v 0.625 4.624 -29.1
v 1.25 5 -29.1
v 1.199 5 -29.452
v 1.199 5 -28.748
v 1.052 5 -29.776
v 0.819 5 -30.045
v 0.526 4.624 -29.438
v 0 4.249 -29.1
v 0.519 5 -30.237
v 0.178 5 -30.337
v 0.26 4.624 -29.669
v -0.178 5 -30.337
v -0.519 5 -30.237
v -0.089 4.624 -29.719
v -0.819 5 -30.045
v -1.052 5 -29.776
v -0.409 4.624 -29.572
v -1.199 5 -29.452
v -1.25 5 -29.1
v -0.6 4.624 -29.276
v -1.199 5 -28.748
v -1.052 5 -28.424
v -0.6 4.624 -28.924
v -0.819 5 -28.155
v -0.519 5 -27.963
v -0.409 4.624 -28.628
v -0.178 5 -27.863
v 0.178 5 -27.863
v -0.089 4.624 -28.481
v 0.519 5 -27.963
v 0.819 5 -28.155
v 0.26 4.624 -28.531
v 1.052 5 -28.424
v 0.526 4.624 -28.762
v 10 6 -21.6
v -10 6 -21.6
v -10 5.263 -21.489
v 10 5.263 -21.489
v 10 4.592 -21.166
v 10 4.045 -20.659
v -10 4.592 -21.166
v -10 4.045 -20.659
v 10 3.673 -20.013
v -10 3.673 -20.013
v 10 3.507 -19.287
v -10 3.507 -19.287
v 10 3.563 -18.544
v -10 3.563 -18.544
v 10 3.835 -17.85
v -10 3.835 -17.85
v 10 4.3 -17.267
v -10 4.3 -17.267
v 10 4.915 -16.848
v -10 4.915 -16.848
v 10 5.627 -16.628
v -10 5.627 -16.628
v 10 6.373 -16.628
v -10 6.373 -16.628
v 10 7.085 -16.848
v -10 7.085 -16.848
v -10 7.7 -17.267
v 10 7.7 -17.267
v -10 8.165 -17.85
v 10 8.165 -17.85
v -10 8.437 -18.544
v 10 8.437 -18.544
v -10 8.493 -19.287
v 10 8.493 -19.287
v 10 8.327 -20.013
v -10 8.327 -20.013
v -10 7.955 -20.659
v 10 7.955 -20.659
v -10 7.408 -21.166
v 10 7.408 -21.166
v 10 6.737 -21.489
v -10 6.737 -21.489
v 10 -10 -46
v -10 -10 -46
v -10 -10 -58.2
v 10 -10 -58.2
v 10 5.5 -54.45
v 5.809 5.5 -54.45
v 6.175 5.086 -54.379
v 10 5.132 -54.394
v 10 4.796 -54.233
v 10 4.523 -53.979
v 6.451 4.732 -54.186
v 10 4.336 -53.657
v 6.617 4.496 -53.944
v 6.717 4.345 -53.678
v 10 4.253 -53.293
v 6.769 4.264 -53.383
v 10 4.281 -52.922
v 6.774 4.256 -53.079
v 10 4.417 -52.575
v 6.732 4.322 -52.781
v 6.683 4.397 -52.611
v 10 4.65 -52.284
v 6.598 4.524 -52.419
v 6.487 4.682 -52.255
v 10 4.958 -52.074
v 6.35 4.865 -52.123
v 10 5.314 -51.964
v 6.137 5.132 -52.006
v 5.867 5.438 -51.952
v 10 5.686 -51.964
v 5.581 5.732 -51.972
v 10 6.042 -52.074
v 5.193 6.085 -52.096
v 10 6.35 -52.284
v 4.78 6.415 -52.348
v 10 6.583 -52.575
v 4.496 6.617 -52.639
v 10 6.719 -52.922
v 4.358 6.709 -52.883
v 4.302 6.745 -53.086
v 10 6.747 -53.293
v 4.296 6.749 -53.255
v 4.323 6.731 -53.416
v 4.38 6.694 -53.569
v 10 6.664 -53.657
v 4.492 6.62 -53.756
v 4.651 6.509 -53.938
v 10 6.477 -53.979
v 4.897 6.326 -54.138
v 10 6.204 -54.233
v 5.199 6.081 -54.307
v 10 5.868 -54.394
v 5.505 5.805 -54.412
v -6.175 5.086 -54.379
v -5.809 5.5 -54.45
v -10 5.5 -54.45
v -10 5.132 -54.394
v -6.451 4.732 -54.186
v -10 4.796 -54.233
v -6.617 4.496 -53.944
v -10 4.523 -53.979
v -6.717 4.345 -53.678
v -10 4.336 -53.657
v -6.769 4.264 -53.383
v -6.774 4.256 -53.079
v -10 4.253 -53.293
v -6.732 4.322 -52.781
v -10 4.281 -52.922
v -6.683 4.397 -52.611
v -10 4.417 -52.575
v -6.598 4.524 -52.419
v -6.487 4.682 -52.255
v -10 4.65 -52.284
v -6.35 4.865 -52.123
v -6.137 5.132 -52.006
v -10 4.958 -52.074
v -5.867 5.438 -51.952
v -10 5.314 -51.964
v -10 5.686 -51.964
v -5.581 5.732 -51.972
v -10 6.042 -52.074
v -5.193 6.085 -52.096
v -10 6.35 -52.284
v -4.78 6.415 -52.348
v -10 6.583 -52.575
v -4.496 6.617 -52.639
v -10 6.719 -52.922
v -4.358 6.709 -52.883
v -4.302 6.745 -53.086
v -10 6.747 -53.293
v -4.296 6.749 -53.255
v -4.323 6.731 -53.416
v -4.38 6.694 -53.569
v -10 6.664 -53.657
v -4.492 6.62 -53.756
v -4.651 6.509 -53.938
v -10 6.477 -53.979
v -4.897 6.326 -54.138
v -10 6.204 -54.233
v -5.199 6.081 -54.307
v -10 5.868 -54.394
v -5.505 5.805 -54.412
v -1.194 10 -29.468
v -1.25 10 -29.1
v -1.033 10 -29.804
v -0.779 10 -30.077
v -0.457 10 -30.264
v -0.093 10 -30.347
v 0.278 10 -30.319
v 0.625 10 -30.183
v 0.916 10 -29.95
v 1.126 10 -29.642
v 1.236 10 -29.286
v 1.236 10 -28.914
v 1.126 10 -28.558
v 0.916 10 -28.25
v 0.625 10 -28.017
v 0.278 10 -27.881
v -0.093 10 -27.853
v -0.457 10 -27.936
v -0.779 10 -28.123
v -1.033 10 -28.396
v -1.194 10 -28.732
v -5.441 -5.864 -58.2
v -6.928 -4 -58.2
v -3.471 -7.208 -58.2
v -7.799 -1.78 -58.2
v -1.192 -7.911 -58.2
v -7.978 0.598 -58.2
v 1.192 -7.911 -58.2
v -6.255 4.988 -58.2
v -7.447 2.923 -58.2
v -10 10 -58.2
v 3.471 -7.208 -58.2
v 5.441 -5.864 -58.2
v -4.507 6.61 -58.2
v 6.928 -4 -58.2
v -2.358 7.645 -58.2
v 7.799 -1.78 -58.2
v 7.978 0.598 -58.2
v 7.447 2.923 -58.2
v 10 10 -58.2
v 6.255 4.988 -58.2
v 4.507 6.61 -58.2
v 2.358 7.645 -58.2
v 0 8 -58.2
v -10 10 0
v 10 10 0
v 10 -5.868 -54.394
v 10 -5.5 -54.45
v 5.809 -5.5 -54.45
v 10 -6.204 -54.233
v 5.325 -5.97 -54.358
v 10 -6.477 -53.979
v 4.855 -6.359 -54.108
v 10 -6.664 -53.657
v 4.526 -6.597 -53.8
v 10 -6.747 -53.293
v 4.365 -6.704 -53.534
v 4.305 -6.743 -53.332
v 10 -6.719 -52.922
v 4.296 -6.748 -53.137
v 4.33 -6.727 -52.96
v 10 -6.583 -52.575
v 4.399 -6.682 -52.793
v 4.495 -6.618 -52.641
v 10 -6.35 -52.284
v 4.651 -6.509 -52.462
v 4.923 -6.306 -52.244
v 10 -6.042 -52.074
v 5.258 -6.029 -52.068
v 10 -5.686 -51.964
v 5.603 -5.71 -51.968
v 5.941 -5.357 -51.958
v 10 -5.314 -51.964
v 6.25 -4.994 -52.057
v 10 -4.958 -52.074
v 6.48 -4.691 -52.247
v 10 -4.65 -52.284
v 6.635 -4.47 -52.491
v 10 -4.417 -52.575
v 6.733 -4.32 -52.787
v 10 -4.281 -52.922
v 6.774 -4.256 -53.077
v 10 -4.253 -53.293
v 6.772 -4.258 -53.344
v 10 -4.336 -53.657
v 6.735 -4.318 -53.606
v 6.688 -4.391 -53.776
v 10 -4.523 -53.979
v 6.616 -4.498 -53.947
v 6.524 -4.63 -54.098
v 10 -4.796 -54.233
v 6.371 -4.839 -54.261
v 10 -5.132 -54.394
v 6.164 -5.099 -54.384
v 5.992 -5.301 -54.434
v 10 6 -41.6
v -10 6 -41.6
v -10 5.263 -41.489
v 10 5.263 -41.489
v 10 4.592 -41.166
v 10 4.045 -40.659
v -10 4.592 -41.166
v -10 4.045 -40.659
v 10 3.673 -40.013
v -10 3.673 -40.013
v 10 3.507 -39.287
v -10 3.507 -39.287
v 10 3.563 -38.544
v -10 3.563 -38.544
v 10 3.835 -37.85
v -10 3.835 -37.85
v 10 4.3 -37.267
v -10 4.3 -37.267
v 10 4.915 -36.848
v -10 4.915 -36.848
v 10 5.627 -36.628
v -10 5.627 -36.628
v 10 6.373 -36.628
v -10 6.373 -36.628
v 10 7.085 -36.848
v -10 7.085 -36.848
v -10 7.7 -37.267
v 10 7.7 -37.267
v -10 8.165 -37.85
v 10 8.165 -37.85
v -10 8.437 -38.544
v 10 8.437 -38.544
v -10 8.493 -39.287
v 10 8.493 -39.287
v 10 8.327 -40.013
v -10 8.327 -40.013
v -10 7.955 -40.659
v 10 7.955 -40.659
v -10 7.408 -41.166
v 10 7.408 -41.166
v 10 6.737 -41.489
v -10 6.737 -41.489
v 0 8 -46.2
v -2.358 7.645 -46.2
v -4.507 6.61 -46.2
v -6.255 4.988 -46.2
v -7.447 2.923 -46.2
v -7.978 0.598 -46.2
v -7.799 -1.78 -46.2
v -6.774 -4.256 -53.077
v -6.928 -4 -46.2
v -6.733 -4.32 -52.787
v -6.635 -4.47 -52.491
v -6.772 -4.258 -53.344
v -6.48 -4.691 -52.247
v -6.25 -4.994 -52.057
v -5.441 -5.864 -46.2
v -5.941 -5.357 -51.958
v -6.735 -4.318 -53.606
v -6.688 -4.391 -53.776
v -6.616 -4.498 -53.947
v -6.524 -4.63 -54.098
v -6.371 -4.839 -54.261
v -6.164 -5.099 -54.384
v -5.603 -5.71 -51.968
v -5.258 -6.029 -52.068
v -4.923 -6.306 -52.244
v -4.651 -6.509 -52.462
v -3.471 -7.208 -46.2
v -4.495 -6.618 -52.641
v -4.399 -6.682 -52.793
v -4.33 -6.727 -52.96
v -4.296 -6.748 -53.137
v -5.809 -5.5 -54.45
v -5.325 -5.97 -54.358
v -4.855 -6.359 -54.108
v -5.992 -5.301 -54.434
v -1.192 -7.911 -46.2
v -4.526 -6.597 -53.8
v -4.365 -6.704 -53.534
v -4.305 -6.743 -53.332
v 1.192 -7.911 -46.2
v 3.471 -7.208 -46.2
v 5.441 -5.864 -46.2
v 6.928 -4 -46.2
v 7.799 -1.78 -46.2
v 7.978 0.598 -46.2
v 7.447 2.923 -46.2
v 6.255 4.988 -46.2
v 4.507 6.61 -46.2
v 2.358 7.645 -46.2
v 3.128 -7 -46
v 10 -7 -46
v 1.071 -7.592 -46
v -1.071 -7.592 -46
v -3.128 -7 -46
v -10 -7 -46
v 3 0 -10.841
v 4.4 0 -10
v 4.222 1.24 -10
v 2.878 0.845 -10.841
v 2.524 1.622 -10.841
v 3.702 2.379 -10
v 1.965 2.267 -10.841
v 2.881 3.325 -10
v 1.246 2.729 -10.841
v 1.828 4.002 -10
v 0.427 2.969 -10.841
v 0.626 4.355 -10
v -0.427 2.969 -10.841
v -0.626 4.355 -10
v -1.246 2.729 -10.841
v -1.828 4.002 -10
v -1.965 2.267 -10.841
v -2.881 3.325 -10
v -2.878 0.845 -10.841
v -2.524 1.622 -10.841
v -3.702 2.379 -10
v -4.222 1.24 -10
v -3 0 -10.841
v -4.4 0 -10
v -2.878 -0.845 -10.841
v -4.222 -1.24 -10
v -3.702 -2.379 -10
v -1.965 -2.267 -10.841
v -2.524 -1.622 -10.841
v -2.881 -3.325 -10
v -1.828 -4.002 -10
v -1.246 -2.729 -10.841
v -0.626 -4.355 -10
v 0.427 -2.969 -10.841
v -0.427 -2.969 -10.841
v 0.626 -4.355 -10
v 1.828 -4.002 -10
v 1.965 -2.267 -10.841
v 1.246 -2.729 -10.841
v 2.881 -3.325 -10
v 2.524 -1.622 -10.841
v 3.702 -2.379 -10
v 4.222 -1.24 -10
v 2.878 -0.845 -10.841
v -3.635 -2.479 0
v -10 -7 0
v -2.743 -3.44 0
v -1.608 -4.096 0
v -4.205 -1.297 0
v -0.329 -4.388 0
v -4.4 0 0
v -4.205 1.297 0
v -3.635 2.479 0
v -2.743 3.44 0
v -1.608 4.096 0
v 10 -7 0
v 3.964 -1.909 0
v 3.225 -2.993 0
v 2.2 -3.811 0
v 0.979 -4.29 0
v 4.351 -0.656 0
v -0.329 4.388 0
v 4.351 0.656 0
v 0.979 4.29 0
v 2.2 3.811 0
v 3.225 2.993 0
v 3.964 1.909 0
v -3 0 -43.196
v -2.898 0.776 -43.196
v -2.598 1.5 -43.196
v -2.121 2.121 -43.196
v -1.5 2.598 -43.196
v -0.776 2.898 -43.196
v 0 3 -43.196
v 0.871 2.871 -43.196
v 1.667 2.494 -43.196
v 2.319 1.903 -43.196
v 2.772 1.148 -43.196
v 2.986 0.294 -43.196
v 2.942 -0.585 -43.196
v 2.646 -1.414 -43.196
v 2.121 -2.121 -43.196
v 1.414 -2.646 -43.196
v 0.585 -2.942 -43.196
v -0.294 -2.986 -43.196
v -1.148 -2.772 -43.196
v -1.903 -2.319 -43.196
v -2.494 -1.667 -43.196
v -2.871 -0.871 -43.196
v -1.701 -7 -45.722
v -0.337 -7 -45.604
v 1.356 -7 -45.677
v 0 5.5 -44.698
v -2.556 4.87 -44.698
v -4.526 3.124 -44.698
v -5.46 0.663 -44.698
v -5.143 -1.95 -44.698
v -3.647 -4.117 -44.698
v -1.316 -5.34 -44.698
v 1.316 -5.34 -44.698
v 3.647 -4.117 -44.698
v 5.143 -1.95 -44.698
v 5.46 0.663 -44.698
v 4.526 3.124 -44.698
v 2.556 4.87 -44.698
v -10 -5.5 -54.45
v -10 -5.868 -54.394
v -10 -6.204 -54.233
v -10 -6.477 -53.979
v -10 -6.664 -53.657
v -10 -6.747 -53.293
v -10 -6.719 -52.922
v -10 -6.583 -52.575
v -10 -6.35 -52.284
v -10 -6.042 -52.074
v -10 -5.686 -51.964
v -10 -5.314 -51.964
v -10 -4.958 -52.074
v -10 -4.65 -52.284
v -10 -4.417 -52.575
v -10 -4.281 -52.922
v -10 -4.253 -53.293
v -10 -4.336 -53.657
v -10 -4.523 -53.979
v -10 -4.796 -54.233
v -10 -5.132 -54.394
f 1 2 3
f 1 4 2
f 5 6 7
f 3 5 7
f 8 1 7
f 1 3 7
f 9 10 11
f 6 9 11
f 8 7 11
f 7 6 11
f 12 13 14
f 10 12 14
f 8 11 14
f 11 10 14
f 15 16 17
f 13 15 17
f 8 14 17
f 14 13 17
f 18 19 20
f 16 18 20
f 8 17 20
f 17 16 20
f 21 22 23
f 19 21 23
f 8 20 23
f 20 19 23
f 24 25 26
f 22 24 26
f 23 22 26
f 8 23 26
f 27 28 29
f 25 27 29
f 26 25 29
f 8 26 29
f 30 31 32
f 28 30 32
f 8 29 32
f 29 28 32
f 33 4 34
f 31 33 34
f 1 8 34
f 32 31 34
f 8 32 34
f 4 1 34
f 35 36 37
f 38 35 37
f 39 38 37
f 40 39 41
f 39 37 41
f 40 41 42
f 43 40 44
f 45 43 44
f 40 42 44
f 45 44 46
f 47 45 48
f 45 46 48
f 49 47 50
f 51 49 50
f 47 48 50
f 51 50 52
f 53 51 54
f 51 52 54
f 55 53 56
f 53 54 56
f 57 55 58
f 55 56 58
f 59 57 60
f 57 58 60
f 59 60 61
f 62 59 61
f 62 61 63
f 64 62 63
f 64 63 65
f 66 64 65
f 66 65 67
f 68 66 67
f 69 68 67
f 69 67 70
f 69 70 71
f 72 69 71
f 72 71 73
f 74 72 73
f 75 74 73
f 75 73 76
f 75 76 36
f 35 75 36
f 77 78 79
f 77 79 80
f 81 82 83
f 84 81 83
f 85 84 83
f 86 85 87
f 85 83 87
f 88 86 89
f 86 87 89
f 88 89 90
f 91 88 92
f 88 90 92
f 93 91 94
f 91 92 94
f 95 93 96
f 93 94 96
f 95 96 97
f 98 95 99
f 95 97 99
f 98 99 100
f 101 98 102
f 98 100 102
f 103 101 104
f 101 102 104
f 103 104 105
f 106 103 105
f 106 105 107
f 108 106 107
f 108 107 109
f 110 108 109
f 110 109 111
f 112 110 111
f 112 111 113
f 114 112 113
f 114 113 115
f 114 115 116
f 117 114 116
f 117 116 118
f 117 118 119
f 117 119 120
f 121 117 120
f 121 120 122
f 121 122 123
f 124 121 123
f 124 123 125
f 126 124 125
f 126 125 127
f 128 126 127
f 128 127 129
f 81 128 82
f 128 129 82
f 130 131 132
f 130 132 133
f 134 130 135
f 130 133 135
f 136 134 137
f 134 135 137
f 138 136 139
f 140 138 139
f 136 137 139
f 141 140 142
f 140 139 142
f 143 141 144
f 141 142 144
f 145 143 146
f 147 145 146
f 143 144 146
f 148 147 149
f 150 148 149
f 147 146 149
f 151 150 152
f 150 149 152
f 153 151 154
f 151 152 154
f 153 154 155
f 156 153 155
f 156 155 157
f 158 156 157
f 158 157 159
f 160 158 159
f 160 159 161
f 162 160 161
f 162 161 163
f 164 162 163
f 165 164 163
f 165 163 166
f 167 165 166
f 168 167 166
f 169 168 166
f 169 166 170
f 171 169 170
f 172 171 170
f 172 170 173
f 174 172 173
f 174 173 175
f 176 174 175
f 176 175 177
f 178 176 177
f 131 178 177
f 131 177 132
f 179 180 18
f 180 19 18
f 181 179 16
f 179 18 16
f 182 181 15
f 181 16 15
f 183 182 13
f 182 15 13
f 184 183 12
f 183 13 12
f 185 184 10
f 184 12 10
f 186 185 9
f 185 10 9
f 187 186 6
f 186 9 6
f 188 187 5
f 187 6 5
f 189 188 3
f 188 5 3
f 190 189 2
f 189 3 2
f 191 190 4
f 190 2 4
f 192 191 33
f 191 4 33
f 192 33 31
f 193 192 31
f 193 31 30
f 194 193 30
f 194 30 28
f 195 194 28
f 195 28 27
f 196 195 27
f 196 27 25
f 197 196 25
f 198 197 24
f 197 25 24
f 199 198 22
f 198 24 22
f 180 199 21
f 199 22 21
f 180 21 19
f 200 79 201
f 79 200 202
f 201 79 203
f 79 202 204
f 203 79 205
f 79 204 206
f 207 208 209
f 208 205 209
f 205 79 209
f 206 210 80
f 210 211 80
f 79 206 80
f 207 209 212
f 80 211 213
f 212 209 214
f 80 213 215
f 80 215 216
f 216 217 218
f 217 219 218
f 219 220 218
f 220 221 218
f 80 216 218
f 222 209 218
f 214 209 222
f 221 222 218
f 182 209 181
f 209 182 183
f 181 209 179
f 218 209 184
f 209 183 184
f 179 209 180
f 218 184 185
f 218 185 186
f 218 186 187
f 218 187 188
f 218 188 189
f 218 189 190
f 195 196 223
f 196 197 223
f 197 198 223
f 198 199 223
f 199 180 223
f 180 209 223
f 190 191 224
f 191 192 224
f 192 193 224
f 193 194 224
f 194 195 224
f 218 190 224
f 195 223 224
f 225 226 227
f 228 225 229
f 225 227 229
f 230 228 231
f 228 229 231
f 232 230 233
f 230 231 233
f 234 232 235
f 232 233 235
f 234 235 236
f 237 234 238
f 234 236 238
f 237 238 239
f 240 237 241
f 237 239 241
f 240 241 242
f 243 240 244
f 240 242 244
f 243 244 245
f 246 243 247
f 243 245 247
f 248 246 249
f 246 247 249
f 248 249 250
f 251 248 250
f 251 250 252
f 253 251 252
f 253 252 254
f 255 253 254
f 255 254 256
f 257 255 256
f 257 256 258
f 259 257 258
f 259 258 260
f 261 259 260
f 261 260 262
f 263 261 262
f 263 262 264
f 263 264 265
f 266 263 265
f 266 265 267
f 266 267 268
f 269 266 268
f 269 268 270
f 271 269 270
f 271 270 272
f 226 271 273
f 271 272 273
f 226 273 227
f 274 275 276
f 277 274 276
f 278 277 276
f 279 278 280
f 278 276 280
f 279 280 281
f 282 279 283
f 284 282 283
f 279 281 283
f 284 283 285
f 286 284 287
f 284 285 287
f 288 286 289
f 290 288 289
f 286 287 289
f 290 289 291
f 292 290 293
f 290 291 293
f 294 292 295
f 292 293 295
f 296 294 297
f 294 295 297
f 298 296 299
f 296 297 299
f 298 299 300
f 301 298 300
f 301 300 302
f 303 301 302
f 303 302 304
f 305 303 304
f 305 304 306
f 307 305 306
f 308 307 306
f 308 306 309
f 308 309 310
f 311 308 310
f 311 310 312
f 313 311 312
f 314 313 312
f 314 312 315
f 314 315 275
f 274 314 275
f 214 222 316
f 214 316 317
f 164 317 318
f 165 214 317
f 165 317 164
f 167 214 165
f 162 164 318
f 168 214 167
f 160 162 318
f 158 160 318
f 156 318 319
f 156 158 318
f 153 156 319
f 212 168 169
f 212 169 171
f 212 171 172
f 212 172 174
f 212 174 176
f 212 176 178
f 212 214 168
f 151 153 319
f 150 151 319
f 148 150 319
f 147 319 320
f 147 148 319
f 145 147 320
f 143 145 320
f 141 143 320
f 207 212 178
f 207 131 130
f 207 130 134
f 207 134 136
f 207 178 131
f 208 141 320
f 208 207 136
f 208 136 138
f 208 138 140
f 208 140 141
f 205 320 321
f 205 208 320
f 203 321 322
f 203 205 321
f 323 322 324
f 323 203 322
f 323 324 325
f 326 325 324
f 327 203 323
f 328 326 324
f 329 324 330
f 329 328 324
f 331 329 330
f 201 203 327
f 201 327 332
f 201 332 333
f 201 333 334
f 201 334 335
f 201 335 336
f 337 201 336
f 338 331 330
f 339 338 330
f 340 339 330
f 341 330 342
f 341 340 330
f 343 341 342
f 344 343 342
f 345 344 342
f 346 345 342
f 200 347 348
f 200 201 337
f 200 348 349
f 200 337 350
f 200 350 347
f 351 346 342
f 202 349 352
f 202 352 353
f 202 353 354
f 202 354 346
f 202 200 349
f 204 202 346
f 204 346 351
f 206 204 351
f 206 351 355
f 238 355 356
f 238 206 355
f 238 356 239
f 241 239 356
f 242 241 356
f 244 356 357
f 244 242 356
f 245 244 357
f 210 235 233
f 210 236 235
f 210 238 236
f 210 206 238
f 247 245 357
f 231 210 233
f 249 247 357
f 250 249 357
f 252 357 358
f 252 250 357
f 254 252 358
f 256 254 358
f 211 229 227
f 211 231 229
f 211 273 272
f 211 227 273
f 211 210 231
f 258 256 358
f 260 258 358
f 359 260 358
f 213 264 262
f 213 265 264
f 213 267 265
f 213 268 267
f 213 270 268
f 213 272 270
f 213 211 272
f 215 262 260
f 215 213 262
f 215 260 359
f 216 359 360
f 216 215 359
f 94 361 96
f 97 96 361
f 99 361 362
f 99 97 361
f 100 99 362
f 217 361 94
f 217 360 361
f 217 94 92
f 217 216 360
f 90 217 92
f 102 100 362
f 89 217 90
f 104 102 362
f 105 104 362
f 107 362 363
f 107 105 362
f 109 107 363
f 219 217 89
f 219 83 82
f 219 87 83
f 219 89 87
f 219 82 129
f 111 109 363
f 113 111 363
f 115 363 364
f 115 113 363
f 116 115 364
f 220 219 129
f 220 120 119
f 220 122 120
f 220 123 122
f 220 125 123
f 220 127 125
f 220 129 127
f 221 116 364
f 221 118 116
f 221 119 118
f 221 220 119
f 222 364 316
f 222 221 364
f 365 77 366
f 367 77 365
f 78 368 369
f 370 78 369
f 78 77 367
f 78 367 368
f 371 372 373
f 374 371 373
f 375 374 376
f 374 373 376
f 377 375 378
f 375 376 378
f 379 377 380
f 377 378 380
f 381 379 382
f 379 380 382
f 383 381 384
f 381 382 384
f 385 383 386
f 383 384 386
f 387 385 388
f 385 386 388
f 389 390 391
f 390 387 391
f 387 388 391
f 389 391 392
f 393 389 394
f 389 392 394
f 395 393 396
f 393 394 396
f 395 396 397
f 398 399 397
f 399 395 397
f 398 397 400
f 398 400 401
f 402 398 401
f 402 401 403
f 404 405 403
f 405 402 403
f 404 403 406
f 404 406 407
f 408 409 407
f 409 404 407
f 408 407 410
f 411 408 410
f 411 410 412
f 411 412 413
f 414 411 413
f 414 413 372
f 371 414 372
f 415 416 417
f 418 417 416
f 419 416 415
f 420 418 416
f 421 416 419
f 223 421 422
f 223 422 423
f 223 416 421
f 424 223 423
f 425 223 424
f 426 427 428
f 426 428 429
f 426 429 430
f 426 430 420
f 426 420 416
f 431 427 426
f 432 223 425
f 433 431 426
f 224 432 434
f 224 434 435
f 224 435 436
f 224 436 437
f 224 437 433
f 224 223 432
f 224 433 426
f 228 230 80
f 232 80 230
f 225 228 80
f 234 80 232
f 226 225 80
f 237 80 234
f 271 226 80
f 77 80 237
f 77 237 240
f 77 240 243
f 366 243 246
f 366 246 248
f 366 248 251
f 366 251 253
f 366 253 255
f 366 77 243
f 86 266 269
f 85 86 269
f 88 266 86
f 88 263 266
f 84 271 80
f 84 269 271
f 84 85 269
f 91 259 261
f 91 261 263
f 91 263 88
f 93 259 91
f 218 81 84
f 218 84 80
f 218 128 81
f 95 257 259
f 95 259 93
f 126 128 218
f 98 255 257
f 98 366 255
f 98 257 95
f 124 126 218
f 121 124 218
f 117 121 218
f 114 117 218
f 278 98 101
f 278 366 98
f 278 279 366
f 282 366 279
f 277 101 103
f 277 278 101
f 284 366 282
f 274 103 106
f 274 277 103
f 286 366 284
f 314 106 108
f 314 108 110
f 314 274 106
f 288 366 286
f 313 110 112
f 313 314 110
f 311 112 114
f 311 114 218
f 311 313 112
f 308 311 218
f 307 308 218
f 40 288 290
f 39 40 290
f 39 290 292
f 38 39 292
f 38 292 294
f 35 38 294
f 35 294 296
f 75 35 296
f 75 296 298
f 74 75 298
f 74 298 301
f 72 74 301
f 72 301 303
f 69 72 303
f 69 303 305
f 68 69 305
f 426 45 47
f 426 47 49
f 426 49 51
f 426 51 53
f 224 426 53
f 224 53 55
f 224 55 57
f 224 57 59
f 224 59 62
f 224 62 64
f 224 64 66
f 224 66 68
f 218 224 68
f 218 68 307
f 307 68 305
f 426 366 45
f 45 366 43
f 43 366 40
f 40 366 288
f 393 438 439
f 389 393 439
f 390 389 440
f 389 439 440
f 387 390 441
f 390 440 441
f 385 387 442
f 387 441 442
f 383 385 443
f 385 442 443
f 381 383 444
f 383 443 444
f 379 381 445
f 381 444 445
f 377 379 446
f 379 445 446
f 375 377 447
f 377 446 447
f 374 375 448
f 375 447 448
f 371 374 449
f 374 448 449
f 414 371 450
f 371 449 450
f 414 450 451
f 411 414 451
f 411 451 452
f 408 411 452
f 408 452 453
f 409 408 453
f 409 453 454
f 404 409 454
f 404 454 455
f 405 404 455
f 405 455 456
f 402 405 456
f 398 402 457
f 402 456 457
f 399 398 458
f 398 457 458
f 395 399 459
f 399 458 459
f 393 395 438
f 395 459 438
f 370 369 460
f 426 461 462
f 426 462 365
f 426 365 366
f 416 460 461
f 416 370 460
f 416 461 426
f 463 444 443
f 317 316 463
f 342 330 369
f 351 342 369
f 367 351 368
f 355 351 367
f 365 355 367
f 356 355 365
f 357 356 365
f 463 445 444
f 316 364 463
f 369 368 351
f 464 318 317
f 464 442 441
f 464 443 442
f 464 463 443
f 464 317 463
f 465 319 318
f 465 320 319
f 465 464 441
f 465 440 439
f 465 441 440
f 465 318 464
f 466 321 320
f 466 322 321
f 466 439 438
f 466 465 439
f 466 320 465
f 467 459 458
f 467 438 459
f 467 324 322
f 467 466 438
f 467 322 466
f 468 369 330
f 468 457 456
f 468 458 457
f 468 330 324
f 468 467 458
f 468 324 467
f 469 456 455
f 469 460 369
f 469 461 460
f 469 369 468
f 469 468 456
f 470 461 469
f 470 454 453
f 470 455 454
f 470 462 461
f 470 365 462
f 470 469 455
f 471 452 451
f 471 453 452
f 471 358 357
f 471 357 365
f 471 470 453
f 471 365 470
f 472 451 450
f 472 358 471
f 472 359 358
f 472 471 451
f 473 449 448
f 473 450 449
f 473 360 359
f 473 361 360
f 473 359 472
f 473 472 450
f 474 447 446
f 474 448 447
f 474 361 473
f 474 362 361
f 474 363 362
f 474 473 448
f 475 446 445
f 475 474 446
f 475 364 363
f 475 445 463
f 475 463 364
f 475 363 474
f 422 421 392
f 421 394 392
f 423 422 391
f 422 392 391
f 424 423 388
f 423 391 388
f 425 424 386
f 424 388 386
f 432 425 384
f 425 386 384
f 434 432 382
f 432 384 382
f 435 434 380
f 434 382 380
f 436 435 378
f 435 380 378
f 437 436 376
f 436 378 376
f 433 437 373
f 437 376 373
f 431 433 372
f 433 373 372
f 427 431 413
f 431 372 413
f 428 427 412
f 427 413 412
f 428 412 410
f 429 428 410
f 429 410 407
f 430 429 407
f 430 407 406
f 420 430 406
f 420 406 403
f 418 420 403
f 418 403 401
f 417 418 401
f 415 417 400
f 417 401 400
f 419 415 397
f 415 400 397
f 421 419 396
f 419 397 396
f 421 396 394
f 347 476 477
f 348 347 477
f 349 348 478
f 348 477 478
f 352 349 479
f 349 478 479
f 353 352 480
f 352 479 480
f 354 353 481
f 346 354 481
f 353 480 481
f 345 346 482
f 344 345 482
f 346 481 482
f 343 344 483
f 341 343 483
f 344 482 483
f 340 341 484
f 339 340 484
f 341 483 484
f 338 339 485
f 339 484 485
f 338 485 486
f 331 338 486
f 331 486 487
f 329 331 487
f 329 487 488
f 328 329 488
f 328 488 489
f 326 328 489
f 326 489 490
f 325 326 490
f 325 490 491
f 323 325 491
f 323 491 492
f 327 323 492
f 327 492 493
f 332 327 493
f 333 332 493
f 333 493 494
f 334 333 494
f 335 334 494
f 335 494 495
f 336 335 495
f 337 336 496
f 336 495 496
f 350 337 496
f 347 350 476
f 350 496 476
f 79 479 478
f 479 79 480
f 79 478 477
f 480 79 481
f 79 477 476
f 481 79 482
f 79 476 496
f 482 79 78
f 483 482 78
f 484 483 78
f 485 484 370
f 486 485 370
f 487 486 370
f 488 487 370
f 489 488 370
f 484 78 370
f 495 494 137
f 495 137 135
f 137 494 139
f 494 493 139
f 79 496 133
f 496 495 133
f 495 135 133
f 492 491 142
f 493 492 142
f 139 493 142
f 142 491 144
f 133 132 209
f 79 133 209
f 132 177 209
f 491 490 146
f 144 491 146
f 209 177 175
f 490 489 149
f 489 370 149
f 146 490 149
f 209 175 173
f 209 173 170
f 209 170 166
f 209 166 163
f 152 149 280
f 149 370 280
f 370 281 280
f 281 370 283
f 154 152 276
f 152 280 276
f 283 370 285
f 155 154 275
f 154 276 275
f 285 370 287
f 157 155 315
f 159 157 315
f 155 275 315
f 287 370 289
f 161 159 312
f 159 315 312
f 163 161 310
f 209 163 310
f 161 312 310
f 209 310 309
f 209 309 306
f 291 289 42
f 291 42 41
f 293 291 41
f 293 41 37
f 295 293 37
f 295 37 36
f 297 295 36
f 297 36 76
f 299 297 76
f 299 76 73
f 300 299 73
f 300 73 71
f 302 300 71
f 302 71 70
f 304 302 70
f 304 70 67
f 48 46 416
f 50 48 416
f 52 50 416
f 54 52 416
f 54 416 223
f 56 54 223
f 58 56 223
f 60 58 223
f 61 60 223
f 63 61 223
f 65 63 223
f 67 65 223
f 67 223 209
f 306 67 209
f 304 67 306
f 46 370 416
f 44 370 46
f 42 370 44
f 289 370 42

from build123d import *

# Parameters (mm, degrees)
SCHIZZO1_W                    = 20
SCHIZZO1_H                    = 20
ESTRUSIONE_ESTRUSIONE1_DEPTH  = 58.2
SCHIZZO2_R                    = 3
TAGLIO_ESTRUSIONE1_DEPTH      = 60.893572276
FORO_FILETTATO_G1_8_1_D       = 8.8
FORO_FILETTATO_G1_8_1_DEPTH   = 10
FORO_FILETTATO_G1_8_1_TIP     = 2.643786724
TAGLIO_ESTRUSIONE5_DEPTH      = 63.347734522
TAGLIO_ESTRUSIONE5_DEPTH_BACK = 63.347734522
FORO_FILETTATO_M3_1_D         = 2.5
FORO_FILETTATO_M3_1_DEPTH     = 5
FORO_FILETTATO_M3_1_TIP       = 0.751075774
FORO_FILETTATO_M3_2_D         = 2.5
M4_CLEARANCE_HOLE1_D          = 5


with BuildPart() as part:
    # Schizzo1 → Estrusione-Estrusione1 (new body)
    with BuildSketch(Plane.XY):
        Rectangle(SCHIZZO1_W, SCHIZZO1_H)
    extrude(amount=-ESTRUSIONE_ESTRUSIONE1_DEPTH)

    # Schizzo2 → Taglio-Estrusione1 (cut, through all)
    with BuildSketch(Plane(origin=(0, 0, -58.2), x_dir=(-1, 0, 0), z_dir=(0, 0, -1))):
        Circle(SCHIZZO2_R)
    extrude(amount=-TAGLIO_ESTRUSIONE1_DEPTH, mode=Mode.SUBTRACT)

    # Foro filettato G1/8-1
    with Locations(Plane.XY):
        with Locations((0, 0)):
            Hole(FORO_FILETTATO_G1_8_1_D / 2, depth=FORO_FILETTATO_G1_8_1_DEPTH)
            with Locations((0, 0, -(FORO_FILETTATO_G1_8_1_DEPTH + FORO_FILETTATO_G1_8_1_TIP / 2))):  # 118° drill point
                Cone(0, FORO_FILETTATO_G1_8_1_D / 2, FORO_FILETTATO_G1_8_1_TIP, mode=Mode.SUBTRACT)

    # Schizzo10 → Taglio-Estrusione5 (cut, two sides: drawn at the far end of the back side and taken through both)
    with BuildSketch(Plane(origin=(10, 0, 0), x_dir=(0, 0, -1), z_dir=(1, 0, 0)).offset(-TAGLIO_ESTRUSIONE5_DEPTH_BACK)):
        Polygon((-131.2640095, -7), (0, -7), (46, -7), (46, -10), (46, -141.2640095), (-112.509379382, -350.53832089), (-289.773388882, -216.27431139), align=None)
    extrude(amount=TAGLIO_ESTRUSIONE5_DEPTH + TAGLIO_ESTRUSIONE5_DEPTH_BACK, mode=Mode.SUBTRACT)

    # Foro filettato M3-1
    with Locations(Plane(origin=(0, 10, -29.1), x_dir=(1, 0, 0), z_dir=(0, 1, 0))):
        with Locations((0, 0)):
            Hole(FORO_FILETTATO_M3_1_D / 2, depth=FORO_FILETTATO_M3_1_DEPTH)
            with Locations((0, 0, -(FORO_FILETTATO_M3_1_DEPTH + FORO_FILETTATO_M3_1_TIP / 2))):  # 118° drill point
                Cone(0, FORO_FILETTATO_M3_1_D / 2, FORO_FILETTATO_M3_1_TIP, mode=Mode.SUBTRACT)

    # Schizzo14 → Foro Ø16.0 (16)-1 (revolve, cut)
    with BuildSketch(Plane(origin=(0, 0, -58.2), x_dir=(0, 1, 0), z_dir=(1, 0, 0))):
        Polygon((0, 0), (0, 16.806884952), (8, 12), (8, 0), align=None)
    revolve(axis=Axis((0, 0, -64.55), (0, 0, 1)), mode=Mode.SUBTRACT)

    # Foro filettato M3-2 (through all)
    with Locations(Plane(origin=(10, 5.5, -53.2), x_dir=(0, 0, 1), z_dir=(1, 0, 0))):
        with Locations((0, 0), (0, 11)):
            Hole(FORO_FILETTATO_M3_2_D / 2)

    # M4 Clearance Hole1 (through all)
    with Locations(Plane(origin=(10, 6, -19.1), x_dir=(0, 0, 1), z_dir=(1, 0, 0))):
        with Locations((0, 0), (-20, 0)):
            Hole(M4_CLEARANCE_HOLE1_D / 2)


solid = part.part
